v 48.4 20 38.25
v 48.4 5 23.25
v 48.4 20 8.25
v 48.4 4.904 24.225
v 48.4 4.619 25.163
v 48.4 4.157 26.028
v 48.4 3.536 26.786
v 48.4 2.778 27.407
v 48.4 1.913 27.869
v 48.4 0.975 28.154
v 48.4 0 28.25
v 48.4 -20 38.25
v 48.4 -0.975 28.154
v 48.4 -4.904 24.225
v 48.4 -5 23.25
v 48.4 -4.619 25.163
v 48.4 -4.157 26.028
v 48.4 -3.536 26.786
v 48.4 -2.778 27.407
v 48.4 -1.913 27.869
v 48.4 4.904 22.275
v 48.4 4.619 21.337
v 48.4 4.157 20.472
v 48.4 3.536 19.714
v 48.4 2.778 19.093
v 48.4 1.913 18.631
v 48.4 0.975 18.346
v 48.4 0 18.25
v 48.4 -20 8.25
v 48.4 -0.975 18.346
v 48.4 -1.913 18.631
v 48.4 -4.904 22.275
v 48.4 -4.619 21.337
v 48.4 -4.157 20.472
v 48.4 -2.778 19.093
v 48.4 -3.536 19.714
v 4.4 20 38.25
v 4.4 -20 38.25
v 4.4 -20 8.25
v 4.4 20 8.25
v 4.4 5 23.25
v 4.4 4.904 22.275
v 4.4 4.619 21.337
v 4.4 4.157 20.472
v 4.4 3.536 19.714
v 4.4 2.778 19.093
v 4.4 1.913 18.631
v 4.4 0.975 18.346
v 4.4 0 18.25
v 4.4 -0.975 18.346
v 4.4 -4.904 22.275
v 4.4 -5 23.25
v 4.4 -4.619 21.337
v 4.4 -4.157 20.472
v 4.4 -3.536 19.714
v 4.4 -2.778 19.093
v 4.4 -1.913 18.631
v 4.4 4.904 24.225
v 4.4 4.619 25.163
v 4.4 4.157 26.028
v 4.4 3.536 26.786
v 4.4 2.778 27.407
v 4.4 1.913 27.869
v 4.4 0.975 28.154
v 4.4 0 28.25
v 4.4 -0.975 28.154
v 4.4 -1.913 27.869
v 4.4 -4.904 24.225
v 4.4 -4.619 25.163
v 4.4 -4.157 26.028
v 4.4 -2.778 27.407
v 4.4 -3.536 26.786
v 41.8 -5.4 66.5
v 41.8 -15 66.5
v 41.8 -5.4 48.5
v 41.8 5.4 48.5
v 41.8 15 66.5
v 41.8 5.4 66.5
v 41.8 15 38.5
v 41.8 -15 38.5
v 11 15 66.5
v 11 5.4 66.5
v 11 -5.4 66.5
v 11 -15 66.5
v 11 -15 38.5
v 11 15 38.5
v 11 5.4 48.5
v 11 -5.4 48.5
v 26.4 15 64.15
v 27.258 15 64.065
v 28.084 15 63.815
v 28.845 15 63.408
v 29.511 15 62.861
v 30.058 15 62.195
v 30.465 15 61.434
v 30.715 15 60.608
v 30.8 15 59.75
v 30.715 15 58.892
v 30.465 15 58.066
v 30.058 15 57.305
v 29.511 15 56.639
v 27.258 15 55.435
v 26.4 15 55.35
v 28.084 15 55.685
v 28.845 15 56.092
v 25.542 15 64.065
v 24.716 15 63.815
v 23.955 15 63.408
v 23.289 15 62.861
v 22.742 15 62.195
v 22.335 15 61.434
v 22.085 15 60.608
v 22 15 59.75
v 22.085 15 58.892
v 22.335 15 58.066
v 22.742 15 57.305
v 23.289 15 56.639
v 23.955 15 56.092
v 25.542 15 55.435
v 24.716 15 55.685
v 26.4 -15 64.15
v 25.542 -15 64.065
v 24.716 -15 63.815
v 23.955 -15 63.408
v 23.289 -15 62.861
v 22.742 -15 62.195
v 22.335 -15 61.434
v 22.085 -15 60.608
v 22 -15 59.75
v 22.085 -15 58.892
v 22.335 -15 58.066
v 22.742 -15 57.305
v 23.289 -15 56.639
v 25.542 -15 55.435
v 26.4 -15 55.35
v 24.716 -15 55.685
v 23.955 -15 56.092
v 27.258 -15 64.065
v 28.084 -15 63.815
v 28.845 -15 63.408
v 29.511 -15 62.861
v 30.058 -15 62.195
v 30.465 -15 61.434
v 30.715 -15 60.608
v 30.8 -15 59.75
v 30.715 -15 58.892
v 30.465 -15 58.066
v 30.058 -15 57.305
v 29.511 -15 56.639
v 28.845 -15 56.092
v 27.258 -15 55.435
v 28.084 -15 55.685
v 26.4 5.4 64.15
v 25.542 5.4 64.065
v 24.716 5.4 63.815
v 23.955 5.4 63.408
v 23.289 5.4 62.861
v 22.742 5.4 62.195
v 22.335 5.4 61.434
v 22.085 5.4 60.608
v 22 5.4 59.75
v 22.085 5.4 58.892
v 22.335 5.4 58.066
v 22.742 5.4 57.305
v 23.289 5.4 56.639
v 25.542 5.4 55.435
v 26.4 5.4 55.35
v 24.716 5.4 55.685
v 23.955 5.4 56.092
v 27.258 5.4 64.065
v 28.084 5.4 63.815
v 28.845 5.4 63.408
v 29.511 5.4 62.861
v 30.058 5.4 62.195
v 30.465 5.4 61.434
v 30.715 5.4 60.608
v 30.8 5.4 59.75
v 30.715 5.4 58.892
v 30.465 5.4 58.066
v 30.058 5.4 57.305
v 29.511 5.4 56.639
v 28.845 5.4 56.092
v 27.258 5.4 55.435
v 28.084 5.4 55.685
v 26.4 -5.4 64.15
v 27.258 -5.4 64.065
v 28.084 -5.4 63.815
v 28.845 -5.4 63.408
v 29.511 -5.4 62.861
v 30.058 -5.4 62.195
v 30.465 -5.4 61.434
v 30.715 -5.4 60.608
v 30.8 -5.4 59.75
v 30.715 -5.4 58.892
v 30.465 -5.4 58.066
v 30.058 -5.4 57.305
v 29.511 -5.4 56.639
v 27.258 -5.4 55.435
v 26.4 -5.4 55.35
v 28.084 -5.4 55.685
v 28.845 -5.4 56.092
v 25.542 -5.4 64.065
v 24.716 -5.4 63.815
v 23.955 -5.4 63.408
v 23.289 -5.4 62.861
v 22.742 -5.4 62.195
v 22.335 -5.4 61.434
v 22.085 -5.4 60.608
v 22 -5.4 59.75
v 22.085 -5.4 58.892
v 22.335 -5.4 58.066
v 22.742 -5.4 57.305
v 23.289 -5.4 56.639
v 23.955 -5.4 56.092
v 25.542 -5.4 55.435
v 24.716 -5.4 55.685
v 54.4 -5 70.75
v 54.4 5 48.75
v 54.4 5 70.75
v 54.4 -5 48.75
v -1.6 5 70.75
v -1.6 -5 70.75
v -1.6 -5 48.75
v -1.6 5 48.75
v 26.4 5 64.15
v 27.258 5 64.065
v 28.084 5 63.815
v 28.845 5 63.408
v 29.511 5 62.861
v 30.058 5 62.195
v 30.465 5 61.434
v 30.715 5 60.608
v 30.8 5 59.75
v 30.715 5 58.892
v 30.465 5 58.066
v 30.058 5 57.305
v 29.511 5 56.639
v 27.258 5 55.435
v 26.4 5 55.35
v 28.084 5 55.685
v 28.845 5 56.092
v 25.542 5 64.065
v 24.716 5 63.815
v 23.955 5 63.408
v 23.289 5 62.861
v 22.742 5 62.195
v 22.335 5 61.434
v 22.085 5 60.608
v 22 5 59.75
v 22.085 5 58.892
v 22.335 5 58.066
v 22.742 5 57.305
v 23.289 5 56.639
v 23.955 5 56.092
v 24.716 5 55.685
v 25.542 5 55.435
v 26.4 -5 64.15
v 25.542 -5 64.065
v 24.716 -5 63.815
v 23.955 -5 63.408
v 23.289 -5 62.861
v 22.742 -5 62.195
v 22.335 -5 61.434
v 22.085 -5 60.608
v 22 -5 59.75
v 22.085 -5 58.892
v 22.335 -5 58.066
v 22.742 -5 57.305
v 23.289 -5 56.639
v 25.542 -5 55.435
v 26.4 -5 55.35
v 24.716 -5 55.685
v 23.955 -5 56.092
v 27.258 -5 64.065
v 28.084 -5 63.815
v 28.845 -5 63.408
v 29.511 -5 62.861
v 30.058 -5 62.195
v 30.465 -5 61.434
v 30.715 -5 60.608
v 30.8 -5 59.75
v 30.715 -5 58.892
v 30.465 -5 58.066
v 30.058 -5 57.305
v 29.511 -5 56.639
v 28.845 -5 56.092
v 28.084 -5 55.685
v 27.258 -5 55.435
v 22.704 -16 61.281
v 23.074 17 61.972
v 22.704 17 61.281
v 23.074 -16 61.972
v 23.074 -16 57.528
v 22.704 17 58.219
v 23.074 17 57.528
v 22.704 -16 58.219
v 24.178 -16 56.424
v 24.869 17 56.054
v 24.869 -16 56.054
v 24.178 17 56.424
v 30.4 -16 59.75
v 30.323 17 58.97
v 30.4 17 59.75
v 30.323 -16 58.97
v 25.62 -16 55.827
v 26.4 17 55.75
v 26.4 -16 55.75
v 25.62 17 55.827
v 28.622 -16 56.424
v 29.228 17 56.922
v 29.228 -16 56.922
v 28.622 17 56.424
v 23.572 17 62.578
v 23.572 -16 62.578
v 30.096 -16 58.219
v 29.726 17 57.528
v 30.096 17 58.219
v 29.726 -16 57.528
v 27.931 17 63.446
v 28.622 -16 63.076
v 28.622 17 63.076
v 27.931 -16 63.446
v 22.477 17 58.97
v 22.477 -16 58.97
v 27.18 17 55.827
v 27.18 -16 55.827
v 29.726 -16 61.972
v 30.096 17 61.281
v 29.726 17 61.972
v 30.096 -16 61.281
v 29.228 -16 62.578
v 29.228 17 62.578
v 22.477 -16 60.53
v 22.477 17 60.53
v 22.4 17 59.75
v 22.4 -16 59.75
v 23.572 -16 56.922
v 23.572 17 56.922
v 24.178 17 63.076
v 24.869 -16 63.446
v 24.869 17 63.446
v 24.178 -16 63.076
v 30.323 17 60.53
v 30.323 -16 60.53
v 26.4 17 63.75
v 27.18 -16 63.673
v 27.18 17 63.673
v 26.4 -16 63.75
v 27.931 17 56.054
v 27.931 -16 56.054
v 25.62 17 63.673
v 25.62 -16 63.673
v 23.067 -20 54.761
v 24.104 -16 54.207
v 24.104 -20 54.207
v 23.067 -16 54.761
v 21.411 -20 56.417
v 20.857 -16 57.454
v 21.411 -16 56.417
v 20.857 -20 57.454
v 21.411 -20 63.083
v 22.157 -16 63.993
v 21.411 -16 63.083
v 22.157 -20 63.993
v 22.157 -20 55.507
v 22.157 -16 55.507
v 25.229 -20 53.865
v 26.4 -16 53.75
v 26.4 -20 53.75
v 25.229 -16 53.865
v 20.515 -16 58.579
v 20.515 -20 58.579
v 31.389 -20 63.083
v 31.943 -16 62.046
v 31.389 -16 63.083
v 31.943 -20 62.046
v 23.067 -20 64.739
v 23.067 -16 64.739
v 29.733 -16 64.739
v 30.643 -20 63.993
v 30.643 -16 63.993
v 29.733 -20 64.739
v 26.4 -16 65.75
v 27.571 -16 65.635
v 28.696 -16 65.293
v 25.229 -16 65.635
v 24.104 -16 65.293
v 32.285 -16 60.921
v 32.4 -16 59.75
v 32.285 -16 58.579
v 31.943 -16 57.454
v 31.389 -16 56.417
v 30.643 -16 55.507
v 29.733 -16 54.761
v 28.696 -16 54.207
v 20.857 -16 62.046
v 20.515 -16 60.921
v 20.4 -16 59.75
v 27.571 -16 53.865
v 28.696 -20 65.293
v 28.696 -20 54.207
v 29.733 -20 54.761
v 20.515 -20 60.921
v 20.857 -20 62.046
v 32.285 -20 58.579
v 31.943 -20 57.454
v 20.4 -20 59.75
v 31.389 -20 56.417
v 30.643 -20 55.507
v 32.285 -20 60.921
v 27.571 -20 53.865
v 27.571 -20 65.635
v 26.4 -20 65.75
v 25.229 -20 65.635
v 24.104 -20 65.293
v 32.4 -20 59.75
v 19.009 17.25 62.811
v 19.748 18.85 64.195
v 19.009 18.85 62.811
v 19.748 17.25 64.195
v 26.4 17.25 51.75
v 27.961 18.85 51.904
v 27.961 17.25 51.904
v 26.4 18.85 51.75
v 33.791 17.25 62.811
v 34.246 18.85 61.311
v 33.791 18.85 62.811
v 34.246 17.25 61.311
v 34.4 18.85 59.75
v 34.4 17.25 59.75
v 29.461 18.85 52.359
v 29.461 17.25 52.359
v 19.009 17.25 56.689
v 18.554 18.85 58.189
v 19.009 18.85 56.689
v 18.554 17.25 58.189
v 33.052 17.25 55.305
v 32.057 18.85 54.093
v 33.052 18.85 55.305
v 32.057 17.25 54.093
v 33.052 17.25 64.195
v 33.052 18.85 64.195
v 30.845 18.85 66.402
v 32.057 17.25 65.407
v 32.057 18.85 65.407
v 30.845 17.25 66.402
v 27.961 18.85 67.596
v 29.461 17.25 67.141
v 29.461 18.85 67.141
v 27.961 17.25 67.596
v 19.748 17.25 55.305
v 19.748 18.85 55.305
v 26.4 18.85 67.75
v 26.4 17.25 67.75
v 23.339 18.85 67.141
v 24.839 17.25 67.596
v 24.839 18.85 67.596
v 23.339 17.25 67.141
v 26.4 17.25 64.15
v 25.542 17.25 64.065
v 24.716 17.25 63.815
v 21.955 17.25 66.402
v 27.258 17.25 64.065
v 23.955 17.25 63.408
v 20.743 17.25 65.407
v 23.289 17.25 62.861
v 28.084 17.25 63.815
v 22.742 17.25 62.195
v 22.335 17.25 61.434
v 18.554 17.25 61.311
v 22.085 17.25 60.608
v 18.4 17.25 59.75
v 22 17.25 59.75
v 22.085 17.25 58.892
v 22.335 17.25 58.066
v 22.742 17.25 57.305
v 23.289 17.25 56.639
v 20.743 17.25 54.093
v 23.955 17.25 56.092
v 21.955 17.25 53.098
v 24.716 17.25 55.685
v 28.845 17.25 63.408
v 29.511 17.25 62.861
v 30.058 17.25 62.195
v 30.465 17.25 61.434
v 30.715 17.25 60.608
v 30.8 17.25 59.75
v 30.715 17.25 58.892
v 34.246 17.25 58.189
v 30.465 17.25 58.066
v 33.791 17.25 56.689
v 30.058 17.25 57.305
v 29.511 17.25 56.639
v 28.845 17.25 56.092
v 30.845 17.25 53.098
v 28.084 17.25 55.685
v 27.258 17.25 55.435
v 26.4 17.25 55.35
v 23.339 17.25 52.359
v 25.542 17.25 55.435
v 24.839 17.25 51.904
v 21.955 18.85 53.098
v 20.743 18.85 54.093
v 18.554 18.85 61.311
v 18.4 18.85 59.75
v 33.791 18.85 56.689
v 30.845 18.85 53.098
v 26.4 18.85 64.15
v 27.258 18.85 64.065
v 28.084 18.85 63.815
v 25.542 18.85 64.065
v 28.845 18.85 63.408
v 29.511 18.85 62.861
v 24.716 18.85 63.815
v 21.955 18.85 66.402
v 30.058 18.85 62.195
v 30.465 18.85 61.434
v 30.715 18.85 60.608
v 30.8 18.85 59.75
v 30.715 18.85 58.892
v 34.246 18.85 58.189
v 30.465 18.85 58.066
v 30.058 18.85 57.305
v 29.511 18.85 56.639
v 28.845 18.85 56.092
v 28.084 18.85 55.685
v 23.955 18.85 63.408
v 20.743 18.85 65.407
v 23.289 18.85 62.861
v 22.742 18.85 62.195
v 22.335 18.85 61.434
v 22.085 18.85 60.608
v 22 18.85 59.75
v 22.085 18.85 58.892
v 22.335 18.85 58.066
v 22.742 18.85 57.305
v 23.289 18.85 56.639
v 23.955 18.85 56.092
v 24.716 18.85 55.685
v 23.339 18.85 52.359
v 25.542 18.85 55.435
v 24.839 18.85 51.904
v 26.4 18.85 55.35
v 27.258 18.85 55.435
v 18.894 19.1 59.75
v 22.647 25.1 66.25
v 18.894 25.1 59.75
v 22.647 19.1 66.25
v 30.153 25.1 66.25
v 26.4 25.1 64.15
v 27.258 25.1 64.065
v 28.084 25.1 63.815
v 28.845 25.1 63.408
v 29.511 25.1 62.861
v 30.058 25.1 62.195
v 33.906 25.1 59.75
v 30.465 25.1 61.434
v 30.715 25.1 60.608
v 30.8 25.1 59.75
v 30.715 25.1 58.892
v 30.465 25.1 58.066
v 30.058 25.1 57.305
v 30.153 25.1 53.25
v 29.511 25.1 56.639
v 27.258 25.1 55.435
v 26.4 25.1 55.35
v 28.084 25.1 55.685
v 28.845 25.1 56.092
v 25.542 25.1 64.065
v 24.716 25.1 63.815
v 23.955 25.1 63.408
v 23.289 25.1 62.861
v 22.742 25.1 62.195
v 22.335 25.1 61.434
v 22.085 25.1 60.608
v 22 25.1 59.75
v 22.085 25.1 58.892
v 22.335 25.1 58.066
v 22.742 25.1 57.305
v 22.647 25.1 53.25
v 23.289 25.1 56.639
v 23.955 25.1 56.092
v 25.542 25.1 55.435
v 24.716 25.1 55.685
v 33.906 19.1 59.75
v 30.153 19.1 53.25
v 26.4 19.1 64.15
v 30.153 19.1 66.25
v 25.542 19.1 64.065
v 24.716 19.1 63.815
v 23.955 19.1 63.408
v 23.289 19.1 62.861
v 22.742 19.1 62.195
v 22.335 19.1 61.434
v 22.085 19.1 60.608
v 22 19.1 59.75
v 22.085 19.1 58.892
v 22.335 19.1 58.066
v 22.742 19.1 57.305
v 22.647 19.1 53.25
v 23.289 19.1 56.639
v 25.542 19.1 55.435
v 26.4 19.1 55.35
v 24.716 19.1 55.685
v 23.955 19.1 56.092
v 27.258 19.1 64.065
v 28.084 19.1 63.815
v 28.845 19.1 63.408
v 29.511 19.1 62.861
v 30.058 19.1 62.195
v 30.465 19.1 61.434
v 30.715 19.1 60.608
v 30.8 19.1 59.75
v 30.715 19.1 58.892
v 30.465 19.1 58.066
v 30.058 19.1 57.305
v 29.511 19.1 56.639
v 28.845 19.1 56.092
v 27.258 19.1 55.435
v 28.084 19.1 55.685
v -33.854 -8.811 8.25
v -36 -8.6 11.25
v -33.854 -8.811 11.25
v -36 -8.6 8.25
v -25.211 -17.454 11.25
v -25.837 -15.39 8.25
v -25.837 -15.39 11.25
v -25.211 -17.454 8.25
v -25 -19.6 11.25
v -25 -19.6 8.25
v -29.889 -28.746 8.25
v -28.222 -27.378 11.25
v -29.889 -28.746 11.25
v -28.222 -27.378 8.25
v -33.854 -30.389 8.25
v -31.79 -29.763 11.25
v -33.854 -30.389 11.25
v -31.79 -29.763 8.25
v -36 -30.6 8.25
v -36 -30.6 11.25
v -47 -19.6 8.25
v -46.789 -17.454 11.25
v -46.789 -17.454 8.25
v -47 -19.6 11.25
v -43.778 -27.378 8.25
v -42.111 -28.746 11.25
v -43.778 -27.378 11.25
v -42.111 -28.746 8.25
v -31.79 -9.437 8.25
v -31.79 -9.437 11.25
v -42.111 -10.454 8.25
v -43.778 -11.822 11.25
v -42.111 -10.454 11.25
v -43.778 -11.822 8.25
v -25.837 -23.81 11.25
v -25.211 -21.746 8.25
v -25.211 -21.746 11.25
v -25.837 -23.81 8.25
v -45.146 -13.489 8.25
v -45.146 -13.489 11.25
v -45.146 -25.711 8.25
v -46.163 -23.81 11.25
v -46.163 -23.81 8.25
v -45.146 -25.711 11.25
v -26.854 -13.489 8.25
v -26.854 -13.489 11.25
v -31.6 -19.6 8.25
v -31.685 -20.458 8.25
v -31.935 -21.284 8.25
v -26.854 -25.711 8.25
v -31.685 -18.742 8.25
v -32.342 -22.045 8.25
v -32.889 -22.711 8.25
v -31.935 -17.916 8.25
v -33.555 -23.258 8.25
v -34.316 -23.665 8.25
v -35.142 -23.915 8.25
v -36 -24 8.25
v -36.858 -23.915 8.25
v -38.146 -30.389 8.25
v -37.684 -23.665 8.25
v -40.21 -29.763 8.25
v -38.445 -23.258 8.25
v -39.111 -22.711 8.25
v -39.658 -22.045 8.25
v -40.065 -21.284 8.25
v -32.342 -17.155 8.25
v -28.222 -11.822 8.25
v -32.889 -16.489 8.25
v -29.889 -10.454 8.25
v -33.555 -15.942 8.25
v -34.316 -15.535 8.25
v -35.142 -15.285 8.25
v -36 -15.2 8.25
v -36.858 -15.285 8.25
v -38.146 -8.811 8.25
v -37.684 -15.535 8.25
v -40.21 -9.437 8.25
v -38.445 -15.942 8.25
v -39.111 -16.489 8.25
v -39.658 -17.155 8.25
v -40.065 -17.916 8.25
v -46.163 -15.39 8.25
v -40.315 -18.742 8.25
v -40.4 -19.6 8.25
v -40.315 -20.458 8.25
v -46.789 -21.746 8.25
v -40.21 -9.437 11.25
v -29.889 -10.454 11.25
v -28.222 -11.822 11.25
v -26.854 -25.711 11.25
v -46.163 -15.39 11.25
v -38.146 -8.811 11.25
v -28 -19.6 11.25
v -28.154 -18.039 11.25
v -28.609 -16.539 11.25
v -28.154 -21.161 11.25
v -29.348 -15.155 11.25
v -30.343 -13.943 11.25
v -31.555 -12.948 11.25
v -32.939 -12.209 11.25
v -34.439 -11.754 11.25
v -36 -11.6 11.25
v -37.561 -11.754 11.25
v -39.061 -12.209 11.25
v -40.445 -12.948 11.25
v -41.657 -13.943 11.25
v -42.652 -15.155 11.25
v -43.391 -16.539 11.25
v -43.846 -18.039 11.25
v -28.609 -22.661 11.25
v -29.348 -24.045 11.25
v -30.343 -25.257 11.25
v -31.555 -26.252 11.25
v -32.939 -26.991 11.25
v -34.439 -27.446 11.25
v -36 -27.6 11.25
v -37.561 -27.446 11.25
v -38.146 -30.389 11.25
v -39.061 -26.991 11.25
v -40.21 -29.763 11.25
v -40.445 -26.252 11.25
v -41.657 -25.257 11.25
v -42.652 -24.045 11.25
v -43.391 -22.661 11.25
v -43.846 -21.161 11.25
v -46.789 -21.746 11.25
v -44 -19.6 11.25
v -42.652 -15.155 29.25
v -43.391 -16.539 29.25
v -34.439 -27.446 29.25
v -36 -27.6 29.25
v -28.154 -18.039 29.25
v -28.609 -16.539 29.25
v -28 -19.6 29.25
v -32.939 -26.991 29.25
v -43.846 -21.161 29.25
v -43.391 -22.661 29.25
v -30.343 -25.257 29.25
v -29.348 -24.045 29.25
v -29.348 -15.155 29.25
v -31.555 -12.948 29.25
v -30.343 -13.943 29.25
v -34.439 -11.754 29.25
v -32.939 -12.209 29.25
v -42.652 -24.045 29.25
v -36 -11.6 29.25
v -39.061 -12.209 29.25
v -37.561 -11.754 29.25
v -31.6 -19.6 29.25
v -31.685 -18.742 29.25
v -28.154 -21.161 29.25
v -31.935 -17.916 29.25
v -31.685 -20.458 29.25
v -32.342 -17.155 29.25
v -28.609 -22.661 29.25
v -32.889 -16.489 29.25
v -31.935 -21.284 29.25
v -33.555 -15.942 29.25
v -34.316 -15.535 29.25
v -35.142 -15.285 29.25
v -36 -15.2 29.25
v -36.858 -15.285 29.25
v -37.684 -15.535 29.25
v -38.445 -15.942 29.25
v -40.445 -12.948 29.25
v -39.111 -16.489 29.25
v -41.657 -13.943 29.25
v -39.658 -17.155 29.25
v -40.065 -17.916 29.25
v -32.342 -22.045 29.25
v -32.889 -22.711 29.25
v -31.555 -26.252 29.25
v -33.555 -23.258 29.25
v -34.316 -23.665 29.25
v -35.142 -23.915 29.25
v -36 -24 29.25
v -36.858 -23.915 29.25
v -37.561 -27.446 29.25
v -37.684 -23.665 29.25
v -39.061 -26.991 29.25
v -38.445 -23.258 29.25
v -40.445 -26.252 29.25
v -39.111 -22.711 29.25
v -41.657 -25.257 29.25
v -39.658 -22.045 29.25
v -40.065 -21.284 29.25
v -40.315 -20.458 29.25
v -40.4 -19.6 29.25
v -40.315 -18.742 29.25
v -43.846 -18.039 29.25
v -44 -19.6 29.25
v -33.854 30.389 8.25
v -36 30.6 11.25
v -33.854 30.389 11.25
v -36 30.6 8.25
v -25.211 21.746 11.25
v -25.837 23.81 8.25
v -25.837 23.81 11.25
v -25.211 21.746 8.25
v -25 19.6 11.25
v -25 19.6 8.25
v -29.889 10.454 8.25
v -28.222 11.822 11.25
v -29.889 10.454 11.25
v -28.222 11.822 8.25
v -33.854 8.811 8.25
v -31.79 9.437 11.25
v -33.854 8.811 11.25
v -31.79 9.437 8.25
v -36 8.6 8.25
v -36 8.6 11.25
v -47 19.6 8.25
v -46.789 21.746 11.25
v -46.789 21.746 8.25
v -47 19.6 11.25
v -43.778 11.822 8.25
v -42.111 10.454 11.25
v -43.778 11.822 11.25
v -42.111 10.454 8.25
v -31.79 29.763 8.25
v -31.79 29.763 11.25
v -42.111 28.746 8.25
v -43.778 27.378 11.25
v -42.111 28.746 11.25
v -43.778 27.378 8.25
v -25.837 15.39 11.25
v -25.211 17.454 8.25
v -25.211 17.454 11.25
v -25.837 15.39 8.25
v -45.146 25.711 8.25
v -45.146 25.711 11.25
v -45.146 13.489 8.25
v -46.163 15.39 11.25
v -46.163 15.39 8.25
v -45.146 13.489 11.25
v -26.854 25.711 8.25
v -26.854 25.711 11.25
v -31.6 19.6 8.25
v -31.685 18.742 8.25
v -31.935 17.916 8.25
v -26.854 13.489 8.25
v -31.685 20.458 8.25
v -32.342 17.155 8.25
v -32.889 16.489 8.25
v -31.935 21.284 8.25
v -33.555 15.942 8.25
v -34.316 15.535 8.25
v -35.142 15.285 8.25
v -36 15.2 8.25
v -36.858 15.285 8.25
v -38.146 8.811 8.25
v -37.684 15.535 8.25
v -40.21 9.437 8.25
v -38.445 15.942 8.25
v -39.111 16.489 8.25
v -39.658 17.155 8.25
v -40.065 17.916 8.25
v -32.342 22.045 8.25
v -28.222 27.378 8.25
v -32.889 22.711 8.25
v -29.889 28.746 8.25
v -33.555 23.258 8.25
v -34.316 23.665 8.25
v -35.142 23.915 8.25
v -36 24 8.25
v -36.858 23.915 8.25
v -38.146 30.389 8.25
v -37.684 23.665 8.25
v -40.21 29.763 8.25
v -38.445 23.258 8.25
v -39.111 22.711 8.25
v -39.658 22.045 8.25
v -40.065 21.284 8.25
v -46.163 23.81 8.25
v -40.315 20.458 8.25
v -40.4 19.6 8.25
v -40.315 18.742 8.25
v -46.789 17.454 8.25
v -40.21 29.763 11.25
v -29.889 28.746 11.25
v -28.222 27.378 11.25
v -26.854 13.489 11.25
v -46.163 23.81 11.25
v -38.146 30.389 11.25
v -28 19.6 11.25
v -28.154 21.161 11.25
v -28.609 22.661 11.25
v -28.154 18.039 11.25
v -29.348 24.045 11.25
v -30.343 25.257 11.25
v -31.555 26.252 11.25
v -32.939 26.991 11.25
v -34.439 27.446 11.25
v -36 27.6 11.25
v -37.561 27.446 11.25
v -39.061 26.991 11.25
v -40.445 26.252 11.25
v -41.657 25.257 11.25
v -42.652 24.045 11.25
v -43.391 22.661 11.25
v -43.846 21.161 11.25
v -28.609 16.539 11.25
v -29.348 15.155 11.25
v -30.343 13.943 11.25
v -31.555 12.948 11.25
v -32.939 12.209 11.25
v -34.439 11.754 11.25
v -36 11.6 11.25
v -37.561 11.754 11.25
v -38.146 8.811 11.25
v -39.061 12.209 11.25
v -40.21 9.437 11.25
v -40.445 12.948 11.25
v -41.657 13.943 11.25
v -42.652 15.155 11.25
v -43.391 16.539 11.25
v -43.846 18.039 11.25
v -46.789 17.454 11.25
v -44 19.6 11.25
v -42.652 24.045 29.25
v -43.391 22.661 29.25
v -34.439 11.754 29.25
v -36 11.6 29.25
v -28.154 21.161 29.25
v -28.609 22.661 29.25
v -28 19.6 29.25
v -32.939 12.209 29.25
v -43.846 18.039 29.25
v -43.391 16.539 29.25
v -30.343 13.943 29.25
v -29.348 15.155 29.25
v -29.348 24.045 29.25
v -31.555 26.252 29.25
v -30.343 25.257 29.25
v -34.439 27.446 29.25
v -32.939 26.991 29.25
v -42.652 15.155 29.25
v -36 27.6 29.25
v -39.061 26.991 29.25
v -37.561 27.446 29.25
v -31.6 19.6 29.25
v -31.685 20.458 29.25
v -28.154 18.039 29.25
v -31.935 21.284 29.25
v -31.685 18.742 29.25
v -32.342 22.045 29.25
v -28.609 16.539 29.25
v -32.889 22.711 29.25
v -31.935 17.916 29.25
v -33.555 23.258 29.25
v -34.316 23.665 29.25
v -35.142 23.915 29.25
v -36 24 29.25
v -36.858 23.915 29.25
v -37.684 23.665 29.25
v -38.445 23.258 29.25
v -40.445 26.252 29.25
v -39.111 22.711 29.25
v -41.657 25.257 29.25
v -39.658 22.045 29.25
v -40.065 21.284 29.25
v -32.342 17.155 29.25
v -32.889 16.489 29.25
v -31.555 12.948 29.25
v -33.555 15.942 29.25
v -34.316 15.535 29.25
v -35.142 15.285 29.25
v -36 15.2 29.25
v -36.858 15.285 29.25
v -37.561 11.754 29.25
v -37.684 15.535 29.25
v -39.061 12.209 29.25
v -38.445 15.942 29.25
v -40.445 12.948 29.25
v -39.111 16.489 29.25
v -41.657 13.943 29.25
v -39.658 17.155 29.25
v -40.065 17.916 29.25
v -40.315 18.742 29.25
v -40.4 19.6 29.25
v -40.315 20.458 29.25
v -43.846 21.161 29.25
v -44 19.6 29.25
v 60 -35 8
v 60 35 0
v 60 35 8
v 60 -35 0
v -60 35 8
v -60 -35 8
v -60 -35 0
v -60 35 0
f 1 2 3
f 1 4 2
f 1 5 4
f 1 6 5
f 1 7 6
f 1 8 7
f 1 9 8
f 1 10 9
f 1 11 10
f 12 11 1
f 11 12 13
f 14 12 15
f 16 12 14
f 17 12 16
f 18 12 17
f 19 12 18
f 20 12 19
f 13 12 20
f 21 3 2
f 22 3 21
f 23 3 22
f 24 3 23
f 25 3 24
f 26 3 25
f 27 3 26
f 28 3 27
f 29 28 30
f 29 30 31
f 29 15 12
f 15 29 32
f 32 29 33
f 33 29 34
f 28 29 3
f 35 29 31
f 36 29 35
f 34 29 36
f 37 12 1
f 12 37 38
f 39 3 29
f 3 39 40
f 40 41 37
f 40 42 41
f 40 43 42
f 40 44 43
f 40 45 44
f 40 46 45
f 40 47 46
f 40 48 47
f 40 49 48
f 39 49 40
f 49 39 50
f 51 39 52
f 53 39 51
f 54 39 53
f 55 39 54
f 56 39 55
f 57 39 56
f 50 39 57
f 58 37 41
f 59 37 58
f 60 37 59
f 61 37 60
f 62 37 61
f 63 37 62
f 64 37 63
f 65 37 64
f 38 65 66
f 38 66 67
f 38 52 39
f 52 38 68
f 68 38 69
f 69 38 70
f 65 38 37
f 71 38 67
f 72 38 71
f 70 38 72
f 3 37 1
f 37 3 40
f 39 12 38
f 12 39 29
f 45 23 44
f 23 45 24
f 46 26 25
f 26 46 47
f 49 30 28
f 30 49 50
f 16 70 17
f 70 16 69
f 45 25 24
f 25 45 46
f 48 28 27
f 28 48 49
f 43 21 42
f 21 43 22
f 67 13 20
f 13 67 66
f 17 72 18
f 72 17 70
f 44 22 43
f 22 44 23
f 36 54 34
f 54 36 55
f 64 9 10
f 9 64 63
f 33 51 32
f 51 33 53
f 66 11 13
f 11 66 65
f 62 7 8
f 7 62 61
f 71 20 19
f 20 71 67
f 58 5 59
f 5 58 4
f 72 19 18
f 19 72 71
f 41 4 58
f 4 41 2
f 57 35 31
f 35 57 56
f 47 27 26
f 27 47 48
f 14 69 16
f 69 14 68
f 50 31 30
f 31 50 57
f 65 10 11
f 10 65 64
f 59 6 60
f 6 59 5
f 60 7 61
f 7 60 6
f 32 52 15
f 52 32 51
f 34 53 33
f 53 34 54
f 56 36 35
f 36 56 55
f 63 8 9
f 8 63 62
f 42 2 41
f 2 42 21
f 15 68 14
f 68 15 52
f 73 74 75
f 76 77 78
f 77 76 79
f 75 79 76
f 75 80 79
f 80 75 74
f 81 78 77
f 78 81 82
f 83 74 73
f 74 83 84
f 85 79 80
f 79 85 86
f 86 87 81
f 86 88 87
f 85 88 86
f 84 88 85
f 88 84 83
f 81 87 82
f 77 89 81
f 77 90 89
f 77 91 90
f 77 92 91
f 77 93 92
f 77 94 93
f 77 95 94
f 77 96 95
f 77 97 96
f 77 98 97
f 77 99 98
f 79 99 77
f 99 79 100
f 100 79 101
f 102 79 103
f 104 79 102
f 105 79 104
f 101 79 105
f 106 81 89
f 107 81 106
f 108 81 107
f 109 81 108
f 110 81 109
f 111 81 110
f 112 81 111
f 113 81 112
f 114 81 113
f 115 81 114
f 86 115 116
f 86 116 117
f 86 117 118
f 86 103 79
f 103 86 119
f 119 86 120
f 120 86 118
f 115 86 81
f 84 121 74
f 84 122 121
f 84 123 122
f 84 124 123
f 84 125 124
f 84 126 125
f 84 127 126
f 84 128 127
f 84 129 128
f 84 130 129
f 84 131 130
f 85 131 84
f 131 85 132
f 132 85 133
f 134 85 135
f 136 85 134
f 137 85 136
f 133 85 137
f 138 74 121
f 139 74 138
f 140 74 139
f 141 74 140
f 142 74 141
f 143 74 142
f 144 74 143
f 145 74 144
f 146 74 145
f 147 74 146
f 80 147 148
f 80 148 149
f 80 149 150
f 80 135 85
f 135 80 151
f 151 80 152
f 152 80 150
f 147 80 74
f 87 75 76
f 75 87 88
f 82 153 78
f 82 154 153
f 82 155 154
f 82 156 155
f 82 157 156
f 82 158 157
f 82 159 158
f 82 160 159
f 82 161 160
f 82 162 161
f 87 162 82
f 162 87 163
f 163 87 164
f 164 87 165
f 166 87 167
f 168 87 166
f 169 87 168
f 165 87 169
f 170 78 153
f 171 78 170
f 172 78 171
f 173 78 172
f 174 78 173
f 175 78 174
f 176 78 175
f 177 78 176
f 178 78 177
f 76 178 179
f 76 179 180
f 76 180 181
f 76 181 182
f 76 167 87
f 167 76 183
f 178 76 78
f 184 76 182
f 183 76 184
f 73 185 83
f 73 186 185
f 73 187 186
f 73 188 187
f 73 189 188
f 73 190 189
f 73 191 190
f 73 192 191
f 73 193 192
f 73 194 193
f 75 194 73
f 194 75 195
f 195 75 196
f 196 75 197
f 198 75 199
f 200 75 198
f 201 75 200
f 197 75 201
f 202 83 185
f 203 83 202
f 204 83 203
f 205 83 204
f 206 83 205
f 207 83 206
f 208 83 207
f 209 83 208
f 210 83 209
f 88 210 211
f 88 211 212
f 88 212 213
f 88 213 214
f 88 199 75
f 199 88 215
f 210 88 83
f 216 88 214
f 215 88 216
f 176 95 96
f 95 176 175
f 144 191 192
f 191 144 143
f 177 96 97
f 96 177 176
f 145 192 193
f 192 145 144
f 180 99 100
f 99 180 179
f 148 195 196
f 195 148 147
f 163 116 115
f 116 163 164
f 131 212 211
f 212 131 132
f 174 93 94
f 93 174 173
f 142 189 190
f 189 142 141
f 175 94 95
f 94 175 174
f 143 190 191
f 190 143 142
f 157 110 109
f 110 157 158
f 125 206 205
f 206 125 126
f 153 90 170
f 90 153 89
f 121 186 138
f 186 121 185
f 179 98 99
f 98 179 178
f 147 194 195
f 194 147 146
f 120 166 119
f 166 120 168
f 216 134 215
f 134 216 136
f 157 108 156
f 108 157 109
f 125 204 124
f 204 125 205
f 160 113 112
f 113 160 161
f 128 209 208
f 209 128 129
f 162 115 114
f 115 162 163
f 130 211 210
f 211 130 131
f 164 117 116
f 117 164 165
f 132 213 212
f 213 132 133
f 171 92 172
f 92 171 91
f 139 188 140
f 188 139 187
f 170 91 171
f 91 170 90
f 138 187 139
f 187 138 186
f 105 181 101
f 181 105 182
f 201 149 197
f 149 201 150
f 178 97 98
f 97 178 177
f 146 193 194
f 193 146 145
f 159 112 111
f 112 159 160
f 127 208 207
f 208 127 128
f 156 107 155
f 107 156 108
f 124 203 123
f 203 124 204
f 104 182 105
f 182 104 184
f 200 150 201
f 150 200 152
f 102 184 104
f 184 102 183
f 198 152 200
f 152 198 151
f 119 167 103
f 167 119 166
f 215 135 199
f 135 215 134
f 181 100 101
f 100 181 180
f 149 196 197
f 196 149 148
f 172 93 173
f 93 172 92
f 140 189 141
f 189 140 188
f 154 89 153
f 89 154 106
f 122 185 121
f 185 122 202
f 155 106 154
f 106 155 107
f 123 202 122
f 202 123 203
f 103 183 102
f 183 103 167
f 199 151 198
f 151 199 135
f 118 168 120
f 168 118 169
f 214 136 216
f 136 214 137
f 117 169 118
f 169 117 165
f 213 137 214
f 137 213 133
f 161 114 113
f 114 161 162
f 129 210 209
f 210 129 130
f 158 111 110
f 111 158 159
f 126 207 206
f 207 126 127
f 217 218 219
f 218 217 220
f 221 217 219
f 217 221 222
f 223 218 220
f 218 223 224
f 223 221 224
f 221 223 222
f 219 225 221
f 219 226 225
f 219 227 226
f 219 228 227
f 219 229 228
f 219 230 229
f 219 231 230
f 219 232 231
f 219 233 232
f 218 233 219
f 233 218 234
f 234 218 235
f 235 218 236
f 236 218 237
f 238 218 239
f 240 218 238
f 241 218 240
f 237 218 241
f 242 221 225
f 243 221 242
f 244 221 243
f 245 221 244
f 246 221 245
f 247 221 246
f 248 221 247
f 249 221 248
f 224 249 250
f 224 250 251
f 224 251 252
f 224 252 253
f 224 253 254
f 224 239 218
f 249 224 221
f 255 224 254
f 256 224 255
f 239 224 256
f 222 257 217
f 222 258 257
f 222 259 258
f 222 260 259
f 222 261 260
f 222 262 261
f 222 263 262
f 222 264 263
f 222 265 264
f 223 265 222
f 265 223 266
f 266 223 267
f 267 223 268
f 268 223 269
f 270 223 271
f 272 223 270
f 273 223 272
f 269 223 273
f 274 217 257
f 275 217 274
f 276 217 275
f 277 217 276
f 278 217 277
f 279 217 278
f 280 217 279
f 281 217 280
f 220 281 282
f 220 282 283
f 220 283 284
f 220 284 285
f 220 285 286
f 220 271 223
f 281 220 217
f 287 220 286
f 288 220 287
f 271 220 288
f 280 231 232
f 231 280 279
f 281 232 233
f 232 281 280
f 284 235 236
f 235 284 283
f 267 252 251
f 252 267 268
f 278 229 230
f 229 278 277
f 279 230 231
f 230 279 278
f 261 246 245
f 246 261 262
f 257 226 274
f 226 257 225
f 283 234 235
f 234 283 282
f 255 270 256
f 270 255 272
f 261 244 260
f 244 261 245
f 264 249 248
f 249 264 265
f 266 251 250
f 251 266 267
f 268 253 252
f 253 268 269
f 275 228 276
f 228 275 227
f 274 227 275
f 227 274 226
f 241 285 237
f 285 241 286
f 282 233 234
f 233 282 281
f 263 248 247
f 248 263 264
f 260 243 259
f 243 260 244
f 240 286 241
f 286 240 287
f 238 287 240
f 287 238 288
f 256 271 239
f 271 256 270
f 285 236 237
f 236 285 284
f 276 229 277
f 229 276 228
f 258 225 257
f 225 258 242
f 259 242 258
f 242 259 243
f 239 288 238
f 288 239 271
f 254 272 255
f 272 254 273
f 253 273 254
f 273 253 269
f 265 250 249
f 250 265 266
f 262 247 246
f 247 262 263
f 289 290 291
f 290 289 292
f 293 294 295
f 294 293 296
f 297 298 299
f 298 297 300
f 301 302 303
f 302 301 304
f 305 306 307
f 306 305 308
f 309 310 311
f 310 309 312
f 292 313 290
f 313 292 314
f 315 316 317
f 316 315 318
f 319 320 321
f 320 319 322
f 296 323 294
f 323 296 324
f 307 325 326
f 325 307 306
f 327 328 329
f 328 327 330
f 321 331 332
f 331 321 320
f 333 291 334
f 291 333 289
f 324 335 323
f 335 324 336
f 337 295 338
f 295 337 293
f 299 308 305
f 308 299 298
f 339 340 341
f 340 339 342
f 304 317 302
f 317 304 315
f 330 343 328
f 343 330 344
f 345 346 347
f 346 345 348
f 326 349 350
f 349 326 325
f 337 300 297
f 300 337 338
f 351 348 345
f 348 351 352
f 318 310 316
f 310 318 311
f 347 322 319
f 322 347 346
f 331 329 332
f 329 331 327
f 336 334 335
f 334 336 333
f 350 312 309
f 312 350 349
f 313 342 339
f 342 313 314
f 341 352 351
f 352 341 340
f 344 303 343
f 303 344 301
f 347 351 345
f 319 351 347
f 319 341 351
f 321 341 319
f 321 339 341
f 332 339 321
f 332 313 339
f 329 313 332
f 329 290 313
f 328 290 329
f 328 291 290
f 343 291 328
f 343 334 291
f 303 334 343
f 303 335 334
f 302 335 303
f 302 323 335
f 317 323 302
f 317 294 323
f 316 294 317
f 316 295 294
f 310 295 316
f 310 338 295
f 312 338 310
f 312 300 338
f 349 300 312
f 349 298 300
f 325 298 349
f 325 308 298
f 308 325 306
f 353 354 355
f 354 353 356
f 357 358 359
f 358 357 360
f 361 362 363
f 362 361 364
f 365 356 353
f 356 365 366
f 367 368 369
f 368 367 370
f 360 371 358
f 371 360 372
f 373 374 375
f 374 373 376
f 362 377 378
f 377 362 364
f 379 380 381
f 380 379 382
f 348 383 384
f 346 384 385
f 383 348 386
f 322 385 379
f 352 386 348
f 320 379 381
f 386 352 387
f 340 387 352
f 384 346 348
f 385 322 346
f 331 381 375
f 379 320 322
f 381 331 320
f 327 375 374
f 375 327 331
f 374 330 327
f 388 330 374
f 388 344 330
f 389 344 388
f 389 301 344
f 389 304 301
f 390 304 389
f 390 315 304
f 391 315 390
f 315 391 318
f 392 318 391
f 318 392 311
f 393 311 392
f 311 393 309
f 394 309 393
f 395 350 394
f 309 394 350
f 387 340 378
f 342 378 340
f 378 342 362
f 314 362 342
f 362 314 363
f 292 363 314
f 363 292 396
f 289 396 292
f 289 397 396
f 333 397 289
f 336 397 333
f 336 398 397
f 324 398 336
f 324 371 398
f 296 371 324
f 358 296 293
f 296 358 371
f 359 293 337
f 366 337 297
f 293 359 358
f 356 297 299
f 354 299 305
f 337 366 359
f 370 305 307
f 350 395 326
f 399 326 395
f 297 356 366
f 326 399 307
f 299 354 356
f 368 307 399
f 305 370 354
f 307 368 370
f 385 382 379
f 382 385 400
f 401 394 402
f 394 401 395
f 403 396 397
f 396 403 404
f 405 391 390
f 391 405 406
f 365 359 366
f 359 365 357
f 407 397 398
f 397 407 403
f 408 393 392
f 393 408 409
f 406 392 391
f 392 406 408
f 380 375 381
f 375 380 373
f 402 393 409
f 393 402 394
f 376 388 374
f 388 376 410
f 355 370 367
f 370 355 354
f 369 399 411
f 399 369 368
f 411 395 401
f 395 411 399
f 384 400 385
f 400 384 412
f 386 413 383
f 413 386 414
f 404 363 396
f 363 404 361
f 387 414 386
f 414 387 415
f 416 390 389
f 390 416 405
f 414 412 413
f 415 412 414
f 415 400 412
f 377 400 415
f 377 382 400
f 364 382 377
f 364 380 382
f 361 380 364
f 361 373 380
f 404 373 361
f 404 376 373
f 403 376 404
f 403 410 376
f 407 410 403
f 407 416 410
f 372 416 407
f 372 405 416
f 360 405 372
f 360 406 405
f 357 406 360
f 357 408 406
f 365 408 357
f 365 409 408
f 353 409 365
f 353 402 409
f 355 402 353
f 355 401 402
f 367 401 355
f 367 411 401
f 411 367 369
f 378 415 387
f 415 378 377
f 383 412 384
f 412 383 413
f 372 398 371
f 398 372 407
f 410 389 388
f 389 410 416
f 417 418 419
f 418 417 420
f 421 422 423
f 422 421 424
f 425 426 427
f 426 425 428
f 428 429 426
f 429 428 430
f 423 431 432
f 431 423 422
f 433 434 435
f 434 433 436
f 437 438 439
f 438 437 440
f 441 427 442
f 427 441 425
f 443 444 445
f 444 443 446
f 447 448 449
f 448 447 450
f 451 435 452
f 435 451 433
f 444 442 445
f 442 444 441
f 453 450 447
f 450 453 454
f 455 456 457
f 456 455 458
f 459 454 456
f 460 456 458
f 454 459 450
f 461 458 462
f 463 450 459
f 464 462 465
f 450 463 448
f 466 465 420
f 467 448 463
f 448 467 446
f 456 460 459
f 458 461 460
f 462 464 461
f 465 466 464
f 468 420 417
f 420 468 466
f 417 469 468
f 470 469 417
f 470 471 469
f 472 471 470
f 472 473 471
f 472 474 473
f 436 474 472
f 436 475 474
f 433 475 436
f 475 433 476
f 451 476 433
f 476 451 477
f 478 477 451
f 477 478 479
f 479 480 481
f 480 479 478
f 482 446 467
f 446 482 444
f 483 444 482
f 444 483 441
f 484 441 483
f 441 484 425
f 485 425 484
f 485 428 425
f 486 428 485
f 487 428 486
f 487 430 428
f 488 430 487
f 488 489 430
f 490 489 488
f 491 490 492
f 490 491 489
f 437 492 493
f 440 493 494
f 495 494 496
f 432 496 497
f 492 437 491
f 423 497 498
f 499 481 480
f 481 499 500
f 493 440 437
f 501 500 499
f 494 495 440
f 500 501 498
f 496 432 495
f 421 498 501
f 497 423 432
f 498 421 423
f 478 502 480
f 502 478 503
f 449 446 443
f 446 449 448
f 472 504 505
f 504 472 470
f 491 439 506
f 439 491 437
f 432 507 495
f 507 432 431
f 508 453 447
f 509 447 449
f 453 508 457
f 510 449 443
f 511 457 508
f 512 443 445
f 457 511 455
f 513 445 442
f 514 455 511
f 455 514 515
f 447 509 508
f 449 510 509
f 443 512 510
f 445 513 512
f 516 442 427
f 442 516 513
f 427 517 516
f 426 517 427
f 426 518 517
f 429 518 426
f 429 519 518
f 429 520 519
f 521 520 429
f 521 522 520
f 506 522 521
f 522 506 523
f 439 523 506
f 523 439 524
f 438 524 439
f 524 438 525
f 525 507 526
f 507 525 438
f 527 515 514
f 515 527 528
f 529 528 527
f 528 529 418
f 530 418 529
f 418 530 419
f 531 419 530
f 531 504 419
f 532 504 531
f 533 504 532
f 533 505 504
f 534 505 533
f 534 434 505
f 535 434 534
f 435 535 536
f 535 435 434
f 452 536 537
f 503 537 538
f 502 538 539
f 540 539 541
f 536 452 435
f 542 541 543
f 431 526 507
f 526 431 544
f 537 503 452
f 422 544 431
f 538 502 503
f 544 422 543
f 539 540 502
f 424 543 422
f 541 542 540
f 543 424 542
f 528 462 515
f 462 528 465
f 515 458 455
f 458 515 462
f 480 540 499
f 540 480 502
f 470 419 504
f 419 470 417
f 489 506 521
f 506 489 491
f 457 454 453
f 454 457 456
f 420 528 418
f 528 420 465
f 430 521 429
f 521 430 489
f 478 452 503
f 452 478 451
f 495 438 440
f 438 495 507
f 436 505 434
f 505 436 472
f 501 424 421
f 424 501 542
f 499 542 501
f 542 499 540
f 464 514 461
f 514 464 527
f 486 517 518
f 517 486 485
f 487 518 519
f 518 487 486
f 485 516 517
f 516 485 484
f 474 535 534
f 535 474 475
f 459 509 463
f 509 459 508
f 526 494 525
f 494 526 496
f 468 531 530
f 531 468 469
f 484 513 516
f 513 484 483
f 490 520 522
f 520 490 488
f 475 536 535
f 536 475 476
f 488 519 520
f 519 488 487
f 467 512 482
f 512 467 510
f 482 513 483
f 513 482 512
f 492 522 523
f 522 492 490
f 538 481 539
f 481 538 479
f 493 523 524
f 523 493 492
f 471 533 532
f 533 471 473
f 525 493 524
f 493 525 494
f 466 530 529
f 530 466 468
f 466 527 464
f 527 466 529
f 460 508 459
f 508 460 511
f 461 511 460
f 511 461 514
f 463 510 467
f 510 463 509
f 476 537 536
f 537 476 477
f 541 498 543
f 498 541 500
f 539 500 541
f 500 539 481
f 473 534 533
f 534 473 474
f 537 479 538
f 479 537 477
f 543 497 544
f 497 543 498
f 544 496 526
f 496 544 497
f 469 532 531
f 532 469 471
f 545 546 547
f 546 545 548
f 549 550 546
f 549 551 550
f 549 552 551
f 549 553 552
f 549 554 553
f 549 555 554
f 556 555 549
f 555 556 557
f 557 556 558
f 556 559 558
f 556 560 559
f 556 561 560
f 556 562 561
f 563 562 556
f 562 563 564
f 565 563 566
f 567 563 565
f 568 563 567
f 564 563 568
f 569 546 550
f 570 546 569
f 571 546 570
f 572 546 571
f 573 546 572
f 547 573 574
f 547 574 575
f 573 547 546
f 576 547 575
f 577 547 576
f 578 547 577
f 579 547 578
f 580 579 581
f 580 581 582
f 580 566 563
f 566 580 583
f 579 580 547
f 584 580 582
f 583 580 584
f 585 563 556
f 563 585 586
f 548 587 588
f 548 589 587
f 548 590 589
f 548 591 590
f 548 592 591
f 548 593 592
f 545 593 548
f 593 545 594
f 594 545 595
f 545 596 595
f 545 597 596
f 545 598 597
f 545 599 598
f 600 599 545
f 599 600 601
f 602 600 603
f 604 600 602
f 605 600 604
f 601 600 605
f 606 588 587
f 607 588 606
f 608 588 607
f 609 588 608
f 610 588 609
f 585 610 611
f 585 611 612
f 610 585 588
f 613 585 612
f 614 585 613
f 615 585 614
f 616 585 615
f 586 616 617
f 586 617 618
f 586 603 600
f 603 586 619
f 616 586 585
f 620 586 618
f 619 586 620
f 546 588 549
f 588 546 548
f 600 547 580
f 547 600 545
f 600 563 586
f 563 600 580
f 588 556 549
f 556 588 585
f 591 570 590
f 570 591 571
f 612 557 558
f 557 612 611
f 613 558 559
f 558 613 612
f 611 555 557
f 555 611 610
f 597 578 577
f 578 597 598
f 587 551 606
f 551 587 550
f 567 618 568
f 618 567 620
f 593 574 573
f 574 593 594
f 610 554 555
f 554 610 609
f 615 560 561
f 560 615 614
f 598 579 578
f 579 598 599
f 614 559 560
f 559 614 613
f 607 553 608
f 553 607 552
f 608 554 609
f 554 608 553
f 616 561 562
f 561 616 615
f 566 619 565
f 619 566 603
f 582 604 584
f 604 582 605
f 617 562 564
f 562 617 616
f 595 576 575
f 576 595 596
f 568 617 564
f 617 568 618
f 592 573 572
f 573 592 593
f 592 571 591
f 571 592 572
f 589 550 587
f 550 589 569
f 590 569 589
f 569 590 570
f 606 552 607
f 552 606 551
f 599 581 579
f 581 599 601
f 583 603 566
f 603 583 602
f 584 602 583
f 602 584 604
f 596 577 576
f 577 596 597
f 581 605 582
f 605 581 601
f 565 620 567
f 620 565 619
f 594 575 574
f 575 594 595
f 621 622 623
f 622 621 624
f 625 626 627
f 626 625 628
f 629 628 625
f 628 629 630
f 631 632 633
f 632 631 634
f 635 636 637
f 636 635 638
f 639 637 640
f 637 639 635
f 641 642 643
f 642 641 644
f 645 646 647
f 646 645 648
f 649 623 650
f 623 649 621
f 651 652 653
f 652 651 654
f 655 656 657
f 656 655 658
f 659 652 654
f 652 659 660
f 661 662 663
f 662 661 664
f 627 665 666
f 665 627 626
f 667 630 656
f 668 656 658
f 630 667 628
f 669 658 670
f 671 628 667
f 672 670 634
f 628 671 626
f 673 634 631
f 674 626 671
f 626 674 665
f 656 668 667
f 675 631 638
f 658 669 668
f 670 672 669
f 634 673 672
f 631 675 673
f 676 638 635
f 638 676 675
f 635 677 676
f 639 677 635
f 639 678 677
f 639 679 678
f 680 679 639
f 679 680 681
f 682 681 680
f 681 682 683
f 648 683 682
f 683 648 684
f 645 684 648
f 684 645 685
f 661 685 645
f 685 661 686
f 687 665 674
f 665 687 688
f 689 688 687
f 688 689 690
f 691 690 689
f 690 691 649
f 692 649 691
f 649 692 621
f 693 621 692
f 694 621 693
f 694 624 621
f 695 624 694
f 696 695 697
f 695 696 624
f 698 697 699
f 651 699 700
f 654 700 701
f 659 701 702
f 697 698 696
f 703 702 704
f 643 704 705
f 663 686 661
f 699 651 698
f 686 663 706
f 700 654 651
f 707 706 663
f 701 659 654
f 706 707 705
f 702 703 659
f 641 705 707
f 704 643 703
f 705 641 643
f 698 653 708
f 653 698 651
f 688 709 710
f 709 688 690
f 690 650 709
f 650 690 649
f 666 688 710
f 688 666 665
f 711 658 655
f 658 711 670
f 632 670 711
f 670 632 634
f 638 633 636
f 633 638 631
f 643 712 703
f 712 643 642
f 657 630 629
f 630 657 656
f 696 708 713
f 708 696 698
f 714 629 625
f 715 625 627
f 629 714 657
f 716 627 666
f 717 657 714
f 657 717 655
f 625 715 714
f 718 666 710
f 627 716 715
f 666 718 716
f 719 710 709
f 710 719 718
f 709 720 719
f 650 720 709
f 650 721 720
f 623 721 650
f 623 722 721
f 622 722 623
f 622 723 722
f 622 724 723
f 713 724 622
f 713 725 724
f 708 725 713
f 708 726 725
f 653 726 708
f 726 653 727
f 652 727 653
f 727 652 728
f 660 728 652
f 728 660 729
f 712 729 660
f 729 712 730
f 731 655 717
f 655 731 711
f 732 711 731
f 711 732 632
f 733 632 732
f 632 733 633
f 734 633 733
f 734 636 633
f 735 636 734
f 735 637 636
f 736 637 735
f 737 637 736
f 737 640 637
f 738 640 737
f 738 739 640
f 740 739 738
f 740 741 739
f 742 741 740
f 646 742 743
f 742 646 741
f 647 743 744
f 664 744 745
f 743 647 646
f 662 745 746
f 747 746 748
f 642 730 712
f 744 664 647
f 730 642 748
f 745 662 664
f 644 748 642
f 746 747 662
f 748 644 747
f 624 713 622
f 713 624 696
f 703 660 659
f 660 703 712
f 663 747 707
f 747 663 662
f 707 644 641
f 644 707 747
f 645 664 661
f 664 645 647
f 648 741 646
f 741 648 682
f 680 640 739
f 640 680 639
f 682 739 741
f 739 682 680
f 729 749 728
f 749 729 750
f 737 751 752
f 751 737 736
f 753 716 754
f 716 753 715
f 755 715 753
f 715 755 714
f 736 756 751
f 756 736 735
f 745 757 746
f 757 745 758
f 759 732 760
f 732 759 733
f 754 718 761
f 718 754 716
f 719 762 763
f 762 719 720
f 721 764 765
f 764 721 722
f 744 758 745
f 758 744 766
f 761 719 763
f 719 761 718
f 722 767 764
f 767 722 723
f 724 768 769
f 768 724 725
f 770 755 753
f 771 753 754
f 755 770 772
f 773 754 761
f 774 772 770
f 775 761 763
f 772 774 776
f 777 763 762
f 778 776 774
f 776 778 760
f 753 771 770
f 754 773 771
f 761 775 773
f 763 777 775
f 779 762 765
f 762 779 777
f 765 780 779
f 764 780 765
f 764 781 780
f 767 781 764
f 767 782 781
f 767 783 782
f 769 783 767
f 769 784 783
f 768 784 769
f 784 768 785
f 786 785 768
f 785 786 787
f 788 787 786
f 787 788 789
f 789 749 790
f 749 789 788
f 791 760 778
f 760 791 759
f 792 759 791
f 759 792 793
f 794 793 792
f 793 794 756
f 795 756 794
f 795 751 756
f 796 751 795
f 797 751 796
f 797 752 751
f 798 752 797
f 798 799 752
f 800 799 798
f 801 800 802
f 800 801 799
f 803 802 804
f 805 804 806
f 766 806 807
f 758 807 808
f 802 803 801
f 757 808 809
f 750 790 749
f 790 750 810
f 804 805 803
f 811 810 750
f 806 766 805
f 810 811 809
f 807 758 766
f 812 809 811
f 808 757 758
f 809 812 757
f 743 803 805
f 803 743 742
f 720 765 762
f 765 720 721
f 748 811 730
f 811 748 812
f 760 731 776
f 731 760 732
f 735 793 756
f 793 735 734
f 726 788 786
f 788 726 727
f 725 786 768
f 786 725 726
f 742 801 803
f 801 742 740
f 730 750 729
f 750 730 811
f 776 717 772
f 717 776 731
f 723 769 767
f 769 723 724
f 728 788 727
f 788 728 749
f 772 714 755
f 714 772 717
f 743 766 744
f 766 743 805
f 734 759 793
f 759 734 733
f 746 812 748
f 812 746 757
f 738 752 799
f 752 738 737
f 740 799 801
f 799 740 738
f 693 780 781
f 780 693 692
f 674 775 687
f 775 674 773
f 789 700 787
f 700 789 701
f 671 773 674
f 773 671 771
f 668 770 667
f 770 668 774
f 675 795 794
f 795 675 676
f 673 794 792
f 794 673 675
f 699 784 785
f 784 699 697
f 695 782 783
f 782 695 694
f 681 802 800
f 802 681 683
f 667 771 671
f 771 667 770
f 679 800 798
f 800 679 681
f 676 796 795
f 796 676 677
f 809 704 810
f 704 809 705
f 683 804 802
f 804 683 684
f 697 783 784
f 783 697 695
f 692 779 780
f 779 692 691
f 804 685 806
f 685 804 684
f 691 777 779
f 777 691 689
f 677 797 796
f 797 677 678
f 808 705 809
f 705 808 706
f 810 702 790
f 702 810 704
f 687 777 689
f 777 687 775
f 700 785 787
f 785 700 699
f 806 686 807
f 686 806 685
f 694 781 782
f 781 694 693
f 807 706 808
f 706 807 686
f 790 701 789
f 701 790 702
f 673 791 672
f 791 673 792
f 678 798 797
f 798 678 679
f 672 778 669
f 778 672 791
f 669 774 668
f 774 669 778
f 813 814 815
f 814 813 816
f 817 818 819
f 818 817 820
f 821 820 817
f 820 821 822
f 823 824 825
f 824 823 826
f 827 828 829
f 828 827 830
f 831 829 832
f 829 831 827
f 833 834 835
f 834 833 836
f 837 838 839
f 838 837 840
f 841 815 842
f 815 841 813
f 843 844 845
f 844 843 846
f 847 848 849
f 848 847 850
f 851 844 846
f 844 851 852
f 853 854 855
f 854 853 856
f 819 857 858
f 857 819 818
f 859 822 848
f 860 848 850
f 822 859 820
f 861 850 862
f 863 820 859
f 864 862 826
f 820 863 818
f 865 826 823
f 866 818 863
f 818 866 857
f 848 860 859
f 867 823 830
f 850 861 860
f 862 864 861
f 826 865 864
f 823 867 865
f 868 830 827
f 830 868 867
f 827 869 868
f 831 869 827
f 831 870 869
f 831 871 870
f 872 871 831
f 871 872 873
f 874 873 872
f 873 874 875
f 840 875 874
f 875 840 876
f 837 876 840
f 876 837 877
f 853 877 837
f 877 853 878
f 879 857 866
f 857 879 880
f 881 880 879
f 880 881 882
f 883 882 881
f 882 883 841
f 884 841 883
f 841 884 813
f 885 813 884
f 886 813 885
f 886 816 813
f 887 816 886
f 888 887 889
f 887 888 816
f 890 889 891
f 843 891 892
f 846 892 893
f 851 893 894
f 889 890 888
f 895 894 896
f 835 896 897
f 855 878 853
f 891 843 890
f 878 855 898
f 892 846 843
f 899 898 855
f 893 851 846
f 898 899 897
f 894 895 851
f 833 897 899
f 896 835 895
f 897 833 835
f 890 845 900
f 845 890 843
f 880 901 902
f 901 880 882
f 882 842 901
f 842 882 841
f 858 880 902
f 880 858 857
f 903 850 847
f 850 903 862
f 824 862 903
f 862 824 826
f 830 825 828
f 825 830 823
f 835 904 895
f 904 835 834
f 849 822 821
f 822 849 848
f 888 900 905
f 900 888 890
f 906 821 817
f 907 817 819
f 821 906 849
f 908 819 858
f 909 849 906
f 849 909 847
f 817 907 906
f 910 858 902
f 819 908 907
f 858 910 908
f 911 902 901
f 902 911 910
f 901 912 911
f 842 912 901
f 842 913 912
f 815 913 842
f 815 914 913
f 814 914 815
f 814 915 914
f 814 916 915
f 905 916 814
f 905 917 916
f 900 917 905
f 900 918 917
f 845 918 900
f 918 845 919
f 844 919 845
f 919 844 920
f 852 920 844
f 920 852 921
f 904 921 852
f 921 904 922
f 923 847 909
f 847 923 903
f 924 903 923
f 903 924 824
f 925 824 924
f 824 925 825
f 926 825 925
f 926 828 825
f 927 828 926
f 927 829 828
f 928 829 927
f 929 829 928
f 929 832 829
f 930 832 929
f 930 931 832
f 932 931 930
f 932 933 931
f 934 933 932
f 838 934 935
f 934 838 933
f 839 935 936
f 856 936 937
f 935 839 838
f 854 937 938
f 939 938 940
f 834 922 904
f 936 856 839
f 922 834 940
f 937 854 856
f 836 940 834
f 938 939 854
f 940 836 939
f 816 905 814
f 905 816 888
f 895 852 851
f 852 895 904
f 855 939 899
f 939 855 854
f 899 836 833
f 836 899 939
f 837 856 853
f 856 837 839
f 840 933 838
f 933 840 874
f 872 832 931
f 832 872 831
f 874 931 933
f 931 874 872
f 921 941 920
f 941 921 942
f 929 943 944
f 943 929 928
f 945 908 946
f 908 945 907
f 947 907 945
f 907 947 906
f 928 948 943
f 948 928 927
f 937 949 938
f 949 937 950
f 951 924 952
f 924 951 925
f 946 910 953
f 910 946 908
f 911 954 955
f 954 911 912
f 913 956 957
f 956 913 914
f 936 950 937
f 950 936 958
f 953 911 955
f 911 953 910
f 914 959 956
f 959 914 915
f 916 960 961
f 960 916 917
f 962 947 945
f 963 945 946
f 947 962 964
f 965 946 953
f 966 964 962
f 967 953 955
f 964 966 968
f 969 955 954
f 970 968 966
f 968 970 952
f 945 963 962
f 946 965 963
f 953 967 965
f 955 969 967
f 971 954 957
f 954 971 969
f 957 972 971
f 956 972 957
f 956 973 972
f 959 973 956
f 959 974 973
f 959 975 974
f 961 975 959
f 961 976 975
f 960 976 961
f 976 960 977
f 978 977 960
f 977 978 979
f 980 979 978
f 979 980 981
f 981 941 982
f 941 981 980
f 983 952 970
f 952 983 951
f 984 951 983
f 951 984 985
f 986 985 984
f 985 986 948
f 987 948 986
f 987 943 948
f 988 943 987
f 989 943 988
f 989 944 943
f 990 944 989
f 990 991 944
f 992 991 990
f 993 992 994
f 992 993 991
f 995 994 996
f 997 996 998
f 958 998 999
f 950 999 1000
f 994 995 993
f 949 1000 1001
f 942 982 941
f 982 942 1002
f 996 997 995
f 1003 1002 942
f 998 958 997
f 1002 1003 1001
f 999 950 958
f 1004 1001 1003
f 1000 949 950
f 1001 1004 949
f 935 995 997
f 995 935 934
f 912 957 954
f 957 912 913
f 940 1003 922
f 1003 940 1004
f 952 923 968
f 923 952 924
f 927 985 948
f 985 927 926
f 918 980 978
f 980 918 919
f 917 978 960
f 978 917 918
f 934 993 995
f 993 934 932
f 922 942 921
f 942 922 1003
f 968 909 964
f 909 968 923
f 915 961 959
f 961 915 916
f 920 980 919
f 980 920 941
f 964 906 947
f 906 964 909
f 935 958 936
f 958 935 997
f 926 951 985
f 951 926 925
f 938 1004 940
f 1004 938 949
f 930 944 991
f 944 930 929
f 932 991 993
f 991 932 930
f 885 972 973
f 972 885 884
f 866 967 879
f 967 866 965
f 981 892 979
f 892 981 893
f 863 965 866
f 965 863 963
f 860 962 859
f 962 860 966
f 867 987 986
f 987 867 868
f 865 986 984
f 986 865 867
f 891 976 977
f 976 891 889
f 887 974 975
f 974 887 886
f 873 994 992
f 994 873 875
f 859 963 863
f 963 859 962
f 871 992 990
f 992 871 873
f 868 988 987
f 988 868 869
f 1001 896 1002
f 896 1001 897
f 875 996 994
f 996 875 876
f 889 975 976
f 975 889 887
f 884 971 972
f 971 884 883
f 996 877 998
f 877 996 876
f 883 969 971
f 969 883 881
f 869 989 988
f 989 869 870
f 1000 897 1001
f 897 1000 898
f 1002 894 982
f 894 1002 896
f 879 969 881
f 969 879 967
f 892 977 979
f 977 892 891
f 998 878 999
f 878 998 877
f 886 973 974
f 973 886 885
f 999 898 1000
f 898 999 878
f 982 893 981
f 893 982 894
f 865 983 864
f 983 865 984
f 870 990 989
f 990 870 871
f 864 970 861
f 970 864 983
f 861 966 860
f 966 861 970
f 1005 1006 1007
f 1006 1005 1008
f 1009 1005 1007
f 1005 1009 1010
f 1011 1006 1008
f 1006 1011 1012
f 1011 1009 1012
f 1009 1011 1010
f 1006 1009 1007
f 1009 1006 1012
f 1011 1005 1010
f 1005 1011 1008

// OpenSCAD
$fn = 32;

// ------------------------------------------------------------------------
// Indexing jig: plate 120 x 70 mm, pin d8
// Every part is its own module, assembly() places every instance.
// ------------------------------------------------------------------------

// --- part 1 ---
module jig_plate() {
  difference() {
    translate([-60, -35, 0]) cube([120, 70, 8]);
  }
}

// --- part 2 ---
module locator_block() {
  difference() {
    translate([-22, -20, 0]) cube([44, 40, 30]);
    translate([0, 0, 15]) rotate([0, 90, 0]) cylinder(h = 46, d = 10, center = true);
  }
}

// --- part 3 ---
module index_fork() {
  difference() {
    translate([-15.4, -15, 0]) cube([30.8, 30, 28]);
    translate([-16.4, -5.4, 10]) cube([32.8, 10.8, 19]);
    translate([0, 0, 21.25]) rotate([90, 0, 0]) cylinder(h = 32, d = 8.8, center = true);
  }
}

// --- part 4 ---
module index_arm() {
  difference() {
    translate([-28, -5, 0]) cube([56, 10, 22]);
    translate([0, 0, 11]) rotate([90, 0, 0]) cylinder(h = 12, d = 8.8, center = true);
  }
}

// --- part 5 ---
module index_pin() {
  rotate([0, 90, 0]) cylinder(h = 34, d = 8, center = true);
  translate([-20, 0, 0]) rotate([0, 90, 0]) cylinder(h = 4, d = 12);
}

// --- part 6 ---
module pin_washer() {
  difference() {
      translate([0, 0, 0]) cylinder(h = 1.6, d = 16);
      translate([0, 0, -1]) cylinder(h = 3.6, d = 8.8);
    }
}

// --- part 7 ---
module lock_nut() {
  difference() {
    linear_extrude(height = 6) polygon(points = [[7.506, 0], [3.753, 6.5], [-3.753, 6.5], [-7.506, 0], [-3.753, -6.5], [3.753, -6.5]]);
    translate([0, 0, -1]) cylinder(h = 8, d = 8.8);
  }
}

// --- part 8 ---
module guide_bush_a() {
  difference() {
    union() {
      cylinder(h = 3, d = 22);
      translate([0, 0, 3]) cylinder(h = 18, d = 16);
    }
    translate([0, 0, -1]) cylinder(h = 23, d = 8.8);
  }
}

// --- part 9 ---
module guide_bush_b() {
  difference() {
    union() {
      cylinder(h = 3, d = 22);
      translate([0, 0, 3]) cylinder(h = 18, d = 16);
    }
    translate([0, 0, -1]) cylinder(h = 23, d = 8.8);
  }
}

// --- assembly ---
module assembly() {
  color([0.80, 0.24, 0.20]) translate([0, 0, 0]) rotate([0, 0, 0]) jig_plate();
  color([0.20, 0.45, 0.75]) translate([26.4, 0, 8.25]) rotate([0, 0, 0]) locator_block();
  color([0.25, 0.62, 0.32]) translate([26.4, 0, 38.5]) rotate([0, 0, 0]) index_fork();
  color([0.92, 0.70, 0.18]) translate([26.4, 0, 48.75]) rotate([0, 0, 0]) index_arm();
  color([0.58, 0.35, 0.70]) translate([26.4, 0, 59.75]) rotate([0, 0, 90]) index_pin();
  color([0.16, 0.66, 0.66]) translate([26.4, 18.85, 59.75]) rotate([90, 0, 0]) pin_washer();
  color([0.85, 0.48, 0.18]) translate([26.4, 25.1, 59.75]) rotate([90, 0, 0]) lock_nut();
  color([0.55, 0.60, 0.65]) translate([-36, -19.6, 8.25]) rotate([0, 0, 0]) guide_bush_a();
  color([0.75, 0.30, 0.55]) translate([-36, 19.6, 8.25]) rotate([0, 0, 0]) guide_bush_b();
}

assembly();
